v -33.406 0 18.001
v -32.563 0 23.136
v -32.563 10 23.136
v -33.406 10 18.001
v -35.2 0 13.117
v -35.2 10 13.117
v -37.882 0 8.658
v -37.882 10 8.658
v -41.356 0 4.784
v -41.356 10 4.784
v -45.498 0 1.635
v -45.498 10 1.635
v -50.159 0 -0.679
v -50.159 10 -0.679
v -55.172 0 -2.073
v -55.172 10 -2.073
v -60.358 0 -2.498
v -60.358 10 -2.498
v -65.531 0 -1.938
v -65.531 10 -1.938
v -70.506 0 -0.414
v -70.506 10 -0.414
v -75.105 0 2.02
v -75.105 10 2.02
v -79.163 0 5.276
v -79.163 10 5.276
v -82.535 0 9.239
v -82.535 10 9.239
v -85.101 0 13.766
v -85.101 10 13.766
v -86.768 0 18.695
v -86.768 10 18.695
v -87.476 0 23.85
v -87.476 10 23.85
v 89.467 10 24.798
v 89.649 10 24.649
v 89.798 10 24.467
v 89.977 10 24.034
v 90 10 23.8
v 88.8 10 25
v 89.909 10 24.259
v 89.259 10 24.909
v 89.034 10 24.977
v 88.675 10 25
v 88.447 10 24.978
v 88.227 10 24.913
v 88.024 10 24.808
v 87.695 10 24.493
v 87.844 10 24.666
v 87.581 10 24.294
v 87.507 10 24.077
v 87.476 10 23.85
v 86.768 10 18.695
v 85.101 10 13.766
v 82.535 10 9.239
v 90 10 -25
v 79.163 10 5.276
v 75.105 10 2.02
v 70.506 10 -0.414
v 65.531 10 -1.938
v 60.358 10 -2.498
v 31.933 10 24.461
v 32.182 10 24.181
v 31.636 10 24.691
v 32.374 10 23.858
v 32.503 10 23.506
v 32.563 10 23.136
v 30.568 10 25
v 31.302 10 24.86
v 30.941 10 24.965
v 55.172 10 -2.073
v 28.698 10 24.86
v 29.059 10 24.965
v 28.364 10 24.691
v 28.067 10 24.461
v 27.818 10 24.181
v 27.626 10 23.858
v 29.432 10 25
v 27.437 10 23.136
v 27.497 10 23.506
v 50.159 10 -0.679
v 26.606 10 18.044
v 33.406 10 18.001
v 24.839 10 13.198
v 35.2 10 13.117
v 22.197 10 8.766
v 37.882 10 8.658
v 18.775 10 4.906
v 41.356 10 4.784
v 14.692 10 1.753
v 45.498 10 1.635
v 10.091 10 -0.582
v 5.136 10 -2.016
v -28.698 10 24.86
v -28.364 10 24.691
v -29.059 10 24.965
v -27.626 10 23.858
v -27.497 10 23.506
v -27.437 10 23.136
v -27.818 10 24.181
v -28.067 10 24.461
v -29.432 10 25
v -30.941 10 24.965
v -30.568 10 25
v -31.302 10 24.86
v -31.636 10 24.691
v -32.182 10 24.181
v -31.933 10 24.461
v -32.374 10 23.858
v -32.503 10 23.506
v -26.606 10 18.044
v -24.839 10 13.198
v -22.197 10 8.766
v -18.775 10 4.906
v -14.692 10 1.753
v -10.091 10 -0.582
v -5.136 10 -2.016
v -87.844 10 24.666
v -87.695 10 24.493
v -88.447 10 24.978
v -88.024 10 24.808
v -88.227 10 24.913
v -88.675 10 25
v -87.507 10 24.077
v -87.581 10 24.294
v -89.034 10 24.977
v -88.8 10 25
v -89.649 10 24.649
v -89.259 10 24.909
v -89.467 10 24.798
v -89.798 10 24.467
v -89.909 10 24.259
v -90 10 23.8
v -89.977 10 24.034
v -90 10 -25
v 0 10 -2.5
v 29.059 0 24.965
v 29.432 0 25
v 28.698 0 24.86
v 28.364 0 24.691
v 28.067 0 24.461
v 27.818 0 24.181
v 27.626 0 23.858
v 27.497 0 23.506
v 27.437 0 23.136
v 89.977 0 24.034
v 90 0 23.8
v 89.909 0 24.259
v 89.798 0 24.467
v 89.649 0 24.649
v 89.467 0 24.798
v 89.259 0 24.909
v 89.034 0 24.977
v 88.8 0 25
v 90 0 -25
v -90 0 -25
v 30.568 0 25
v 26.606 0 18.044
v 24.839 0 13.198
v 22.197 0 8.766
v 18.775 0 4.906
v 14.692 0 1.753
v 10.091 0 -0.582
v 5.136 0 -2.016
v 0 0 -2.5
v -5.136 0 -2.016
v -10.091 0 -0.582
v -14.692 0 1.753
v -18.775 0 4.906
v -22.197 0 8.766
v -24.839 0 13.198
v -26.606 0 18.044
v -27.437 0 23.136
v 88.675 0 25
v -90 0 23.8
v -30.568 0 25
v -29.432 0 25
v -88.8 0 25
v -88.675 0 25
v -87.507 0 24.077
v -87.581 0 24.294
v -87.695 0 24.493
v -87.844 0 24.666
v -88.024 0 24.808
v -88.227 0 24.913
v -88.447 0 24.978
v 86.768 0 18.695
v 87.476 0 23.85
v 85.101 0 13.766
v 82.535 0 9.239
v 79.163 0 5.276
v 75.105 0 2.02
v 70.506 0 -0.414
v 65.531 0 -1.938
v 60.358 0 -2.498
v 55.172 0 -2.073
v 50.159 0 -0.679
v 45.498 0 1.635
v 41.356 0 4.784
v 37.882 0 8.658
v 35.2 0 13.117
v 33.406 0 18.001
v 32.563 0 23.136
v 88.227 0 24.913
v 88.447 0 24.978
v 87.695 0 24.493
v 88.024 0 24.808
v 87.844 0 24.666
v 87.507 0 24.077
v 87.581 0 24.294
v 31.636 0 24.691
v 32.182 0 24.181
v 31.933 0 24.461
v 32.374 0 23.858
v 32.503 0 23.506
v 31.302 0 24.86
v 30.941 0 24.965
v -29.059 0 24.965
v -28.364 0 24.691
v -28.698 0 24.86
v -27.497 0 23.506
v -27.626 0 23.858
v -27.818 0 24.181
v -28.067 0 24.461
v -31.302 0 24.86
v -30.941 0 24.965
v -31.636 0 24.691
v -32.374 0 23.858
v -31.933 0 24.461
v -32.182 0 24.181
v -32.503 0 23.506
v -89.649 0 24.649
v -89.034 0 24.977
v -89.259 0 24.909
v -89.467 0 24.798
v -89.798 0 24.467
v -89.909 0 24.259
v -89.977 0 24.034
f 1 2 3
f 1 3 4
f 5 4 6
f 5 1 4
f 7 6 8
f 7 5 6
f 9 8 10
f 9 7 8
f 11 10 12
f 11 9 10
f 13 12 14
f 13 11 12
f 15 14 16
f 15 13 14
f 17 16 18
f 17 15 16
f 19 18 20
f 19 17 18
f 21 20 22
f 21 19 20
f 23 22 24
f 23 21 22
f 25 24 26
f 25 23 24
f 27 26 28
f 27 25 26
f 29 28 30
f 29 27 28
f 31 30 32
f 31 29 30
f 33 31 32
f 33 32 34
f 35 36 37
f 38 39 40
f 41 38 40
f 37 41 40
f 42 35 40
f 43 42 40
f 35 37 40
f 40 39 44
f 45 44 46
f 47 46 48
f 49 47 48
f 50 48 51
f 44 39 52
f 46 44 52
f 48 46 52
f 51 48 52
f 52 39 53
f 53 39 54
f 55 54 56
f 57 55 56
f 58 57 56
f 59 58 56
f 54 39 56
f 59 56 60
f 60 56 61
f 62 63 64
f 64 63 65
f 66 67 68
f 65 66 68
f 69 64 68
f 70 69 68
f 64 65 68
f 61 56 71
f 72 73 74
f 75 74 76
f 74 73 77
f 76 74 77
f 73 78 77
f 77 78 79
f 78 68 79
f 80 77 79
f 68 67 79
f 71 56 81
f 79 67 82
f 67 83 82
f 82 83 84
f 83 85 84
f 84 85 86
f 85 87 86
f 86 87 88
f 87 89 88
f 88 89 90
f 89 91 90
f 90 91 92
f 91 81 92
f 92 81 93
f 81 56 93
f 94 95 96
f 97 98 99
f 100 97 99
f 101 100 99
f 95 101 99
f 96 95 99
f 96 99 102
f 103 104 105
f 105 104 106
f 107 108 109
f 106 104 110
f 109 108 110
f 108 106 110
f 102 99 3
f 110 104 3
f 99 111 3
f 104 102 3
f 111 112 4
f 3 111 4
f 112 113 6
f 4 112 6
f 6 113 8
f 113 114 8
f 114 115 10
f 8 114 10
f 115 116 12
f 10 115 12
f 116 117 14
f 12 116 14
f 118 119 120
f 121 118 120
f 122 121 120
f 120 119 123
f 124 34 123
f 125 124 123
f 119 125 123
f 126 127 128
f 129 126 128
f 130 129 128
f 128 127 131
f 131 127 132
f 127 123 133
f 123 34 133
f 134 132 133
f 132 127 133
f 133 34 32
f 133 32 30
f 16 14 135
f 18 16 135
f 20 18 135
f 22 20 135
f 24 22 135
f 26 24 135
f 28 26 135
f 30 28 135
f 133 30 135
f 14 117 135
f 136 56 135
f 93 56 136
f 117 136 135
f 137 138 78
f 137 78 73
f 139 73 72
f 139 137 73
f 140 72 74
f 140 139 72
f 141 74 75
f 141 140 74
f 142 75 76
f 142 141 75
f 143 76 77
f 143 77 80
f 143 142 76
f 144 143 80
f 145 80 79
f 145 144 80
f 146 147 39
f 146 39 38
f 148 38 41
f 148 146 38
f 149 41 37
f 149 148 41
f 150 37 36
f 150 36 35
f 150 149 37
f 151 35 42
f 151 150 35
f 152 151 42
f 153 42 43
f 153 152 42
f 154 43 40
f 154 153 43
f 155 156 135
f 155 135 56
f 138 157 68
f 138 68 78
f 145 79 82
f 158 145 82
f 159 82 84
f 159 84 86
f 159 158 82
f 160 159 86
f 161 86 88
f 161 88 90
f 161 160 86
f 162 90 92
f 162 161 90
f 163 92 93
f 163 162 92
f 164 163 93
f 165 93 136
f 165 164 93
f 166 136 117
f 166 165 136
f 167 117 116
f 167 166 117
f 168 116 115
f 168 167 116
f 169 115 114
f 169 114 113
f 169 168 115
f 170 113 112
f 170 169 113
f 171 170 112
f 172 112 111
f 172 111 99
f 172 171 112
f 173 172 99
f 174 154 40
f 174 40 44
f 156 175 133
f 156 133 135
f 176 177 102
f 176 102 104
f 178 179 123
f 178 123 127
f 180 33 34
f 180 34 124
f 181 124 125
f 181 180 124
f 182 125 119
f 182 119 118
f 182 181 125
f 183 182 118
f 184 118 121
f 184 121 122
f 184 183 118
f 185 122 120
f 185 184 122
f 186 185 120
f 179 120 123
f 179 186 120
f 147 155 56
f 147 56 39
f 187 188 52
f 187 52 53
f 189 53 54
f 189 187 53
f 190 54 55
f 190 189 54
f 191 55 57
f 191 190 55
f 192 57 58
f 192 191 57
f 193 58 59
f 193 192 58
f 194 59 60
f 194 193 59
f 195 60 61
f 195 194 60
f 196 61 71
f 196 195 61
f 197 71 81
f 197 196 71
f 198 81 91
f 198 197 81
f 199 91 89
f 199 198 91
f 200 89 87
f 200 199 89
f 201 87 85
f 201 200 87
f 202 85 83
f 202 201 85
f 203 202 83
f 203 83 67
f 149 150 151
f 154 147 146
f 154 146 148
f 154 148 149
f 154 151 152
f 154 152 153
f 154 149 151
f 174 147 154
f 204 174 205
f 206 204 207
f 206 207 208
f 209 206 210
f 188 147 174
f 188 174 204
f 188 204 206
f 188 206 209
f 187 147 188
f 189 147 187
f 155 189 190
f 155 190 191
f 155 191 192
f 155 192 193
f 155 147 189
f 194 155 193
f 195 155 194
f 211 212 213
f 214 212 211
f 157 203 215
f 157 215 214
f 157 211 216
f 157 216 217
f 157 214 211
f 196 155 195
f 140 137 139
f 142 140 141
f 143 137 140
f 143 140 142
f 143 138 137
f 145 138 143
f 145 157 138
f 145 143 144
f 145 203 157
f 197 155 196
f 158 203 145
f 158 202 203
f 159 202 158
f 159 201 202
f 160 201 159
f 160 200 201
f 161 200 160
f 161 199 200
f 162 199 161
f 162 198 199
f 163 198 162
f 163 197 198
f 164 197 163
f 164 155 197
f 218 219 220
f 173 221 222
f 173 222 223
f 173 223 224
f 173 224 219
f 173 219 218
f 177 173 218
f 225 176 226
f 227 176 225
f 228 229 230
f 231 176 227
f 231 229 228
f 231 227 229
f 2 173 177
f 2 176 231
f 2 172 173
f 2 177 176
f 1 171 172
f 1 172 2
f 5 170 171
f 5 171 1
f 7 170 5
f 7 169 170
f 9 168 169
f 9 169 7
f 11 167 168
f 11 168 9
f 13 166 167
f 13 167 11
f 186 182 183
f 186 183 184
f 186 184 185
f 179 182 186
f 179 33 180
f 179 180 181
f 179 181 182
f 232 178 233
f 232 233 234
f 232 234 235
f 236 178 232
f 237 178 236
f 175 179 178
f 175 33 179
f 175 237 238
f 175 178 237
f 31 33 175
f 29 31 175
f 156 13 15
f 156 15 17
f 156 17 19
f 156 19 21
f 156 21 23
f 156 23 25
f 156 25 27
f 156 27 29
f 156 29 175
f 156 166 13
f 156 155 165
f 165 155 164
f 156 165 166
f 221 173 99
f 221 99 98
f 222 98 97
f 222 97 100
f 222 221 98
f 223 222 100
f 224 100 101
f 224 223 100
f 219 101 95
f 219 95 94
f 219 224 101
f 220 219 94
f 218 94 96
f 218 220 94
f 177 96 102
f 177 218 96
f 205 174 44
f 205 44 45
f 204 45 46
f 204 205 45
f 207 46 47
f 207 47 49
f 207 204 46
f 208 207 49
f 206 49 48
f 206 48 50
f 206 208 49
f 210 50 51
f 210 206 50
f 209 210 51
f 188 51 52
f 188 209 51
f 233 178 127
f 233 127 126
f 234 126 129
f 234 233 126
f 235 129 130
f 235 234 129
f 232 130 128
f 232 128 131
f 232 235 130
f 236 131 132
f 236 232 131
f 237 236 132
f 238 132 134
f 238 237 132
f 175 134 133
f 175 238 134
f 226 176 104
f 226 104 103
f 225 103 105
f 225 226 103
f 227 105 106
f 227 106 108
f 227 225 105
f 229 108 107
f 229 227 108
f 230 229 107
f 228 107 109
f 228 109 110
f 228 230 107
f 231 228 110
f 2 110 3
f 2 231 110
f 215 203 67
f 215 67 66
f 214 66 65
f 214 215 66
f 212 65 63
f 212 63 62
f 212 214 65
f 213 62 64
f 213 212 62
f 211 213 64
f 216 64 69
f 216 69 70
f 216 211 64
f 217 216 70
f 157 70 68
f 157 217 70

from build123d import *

# Parameters (mm, degrees)
BOSS_EXTRU_1_DEPTH = 10


with BuildPart() as part:
    # Esquisse1 → Boss.-Extru.1 (new body)
    with BuildSketch(Plane(origin=(0, 0, 0), x_dir=(1, 0, 0), z_dir=(0, 1, 0))):
        with BuildLine():
            Line((-88.674901918, -25), (-88.8, -25))
            ThreePointArc((-88.8, -25), (-89.648528137, -24.648528137), (-90, -23.8))
            Line((-90, -23.8), (-90, 25))
            Line((-90, 25), (90, 25))
            Line((90, 25), (90, -23.8))
            ThreePointArc((90, -23.8), (89.648528137, -24.648528137), (88.8, -25))
            Line((88.8, -25), (88.674901918, -25))
            ThreePointArc((88.674901918, -25), (87.844302453, -24.666085752), (87.475951315, -23.850174216))
            ThreePointArc((87.475951315, -23.850174216), (60.357828362, 2.497671881), (32.56327302, -23.13559322))
            ThreePointArc((32.56327302, -23.13559322), (31.933307512, -24.461366901), (30.567874694, -25))
            Line((30.567874694, -25), (29.432125306, -25))
            ThreePointArc((29.432125306, -25), (28.066692488, -24.461366901), (27.43672698, -23.13559322))
            ThreePointArc((27.43672698, -23.13559322), (0, 2.5), (-27.43672698, -23.13559322))
            ThreePointArc((-27.43672698, -23.13559322), (-28.066692488, -24.461366901), (-29.432125306, -25))
            Line((-29.432125306, -25), (-30.567874694, -25))
            ThreePointArc((-30.567874694, -25), (-31.933307512, -24.461366901), (-32.56327302, -23.13559322))
            ThreePointArc((-32.56327302, -23.13559322), (-60.357828362, 2.497671881), (-87.475951315, -23.850174216))
            ThreePointArc((-87.475951315, -23.850174216), (-87.844302453, -24.666085752), (-88.674901918, -25))
        make_face()
    extrude(amount=BOSS_EXTRU_1_DEPTH)


solid = part.part
